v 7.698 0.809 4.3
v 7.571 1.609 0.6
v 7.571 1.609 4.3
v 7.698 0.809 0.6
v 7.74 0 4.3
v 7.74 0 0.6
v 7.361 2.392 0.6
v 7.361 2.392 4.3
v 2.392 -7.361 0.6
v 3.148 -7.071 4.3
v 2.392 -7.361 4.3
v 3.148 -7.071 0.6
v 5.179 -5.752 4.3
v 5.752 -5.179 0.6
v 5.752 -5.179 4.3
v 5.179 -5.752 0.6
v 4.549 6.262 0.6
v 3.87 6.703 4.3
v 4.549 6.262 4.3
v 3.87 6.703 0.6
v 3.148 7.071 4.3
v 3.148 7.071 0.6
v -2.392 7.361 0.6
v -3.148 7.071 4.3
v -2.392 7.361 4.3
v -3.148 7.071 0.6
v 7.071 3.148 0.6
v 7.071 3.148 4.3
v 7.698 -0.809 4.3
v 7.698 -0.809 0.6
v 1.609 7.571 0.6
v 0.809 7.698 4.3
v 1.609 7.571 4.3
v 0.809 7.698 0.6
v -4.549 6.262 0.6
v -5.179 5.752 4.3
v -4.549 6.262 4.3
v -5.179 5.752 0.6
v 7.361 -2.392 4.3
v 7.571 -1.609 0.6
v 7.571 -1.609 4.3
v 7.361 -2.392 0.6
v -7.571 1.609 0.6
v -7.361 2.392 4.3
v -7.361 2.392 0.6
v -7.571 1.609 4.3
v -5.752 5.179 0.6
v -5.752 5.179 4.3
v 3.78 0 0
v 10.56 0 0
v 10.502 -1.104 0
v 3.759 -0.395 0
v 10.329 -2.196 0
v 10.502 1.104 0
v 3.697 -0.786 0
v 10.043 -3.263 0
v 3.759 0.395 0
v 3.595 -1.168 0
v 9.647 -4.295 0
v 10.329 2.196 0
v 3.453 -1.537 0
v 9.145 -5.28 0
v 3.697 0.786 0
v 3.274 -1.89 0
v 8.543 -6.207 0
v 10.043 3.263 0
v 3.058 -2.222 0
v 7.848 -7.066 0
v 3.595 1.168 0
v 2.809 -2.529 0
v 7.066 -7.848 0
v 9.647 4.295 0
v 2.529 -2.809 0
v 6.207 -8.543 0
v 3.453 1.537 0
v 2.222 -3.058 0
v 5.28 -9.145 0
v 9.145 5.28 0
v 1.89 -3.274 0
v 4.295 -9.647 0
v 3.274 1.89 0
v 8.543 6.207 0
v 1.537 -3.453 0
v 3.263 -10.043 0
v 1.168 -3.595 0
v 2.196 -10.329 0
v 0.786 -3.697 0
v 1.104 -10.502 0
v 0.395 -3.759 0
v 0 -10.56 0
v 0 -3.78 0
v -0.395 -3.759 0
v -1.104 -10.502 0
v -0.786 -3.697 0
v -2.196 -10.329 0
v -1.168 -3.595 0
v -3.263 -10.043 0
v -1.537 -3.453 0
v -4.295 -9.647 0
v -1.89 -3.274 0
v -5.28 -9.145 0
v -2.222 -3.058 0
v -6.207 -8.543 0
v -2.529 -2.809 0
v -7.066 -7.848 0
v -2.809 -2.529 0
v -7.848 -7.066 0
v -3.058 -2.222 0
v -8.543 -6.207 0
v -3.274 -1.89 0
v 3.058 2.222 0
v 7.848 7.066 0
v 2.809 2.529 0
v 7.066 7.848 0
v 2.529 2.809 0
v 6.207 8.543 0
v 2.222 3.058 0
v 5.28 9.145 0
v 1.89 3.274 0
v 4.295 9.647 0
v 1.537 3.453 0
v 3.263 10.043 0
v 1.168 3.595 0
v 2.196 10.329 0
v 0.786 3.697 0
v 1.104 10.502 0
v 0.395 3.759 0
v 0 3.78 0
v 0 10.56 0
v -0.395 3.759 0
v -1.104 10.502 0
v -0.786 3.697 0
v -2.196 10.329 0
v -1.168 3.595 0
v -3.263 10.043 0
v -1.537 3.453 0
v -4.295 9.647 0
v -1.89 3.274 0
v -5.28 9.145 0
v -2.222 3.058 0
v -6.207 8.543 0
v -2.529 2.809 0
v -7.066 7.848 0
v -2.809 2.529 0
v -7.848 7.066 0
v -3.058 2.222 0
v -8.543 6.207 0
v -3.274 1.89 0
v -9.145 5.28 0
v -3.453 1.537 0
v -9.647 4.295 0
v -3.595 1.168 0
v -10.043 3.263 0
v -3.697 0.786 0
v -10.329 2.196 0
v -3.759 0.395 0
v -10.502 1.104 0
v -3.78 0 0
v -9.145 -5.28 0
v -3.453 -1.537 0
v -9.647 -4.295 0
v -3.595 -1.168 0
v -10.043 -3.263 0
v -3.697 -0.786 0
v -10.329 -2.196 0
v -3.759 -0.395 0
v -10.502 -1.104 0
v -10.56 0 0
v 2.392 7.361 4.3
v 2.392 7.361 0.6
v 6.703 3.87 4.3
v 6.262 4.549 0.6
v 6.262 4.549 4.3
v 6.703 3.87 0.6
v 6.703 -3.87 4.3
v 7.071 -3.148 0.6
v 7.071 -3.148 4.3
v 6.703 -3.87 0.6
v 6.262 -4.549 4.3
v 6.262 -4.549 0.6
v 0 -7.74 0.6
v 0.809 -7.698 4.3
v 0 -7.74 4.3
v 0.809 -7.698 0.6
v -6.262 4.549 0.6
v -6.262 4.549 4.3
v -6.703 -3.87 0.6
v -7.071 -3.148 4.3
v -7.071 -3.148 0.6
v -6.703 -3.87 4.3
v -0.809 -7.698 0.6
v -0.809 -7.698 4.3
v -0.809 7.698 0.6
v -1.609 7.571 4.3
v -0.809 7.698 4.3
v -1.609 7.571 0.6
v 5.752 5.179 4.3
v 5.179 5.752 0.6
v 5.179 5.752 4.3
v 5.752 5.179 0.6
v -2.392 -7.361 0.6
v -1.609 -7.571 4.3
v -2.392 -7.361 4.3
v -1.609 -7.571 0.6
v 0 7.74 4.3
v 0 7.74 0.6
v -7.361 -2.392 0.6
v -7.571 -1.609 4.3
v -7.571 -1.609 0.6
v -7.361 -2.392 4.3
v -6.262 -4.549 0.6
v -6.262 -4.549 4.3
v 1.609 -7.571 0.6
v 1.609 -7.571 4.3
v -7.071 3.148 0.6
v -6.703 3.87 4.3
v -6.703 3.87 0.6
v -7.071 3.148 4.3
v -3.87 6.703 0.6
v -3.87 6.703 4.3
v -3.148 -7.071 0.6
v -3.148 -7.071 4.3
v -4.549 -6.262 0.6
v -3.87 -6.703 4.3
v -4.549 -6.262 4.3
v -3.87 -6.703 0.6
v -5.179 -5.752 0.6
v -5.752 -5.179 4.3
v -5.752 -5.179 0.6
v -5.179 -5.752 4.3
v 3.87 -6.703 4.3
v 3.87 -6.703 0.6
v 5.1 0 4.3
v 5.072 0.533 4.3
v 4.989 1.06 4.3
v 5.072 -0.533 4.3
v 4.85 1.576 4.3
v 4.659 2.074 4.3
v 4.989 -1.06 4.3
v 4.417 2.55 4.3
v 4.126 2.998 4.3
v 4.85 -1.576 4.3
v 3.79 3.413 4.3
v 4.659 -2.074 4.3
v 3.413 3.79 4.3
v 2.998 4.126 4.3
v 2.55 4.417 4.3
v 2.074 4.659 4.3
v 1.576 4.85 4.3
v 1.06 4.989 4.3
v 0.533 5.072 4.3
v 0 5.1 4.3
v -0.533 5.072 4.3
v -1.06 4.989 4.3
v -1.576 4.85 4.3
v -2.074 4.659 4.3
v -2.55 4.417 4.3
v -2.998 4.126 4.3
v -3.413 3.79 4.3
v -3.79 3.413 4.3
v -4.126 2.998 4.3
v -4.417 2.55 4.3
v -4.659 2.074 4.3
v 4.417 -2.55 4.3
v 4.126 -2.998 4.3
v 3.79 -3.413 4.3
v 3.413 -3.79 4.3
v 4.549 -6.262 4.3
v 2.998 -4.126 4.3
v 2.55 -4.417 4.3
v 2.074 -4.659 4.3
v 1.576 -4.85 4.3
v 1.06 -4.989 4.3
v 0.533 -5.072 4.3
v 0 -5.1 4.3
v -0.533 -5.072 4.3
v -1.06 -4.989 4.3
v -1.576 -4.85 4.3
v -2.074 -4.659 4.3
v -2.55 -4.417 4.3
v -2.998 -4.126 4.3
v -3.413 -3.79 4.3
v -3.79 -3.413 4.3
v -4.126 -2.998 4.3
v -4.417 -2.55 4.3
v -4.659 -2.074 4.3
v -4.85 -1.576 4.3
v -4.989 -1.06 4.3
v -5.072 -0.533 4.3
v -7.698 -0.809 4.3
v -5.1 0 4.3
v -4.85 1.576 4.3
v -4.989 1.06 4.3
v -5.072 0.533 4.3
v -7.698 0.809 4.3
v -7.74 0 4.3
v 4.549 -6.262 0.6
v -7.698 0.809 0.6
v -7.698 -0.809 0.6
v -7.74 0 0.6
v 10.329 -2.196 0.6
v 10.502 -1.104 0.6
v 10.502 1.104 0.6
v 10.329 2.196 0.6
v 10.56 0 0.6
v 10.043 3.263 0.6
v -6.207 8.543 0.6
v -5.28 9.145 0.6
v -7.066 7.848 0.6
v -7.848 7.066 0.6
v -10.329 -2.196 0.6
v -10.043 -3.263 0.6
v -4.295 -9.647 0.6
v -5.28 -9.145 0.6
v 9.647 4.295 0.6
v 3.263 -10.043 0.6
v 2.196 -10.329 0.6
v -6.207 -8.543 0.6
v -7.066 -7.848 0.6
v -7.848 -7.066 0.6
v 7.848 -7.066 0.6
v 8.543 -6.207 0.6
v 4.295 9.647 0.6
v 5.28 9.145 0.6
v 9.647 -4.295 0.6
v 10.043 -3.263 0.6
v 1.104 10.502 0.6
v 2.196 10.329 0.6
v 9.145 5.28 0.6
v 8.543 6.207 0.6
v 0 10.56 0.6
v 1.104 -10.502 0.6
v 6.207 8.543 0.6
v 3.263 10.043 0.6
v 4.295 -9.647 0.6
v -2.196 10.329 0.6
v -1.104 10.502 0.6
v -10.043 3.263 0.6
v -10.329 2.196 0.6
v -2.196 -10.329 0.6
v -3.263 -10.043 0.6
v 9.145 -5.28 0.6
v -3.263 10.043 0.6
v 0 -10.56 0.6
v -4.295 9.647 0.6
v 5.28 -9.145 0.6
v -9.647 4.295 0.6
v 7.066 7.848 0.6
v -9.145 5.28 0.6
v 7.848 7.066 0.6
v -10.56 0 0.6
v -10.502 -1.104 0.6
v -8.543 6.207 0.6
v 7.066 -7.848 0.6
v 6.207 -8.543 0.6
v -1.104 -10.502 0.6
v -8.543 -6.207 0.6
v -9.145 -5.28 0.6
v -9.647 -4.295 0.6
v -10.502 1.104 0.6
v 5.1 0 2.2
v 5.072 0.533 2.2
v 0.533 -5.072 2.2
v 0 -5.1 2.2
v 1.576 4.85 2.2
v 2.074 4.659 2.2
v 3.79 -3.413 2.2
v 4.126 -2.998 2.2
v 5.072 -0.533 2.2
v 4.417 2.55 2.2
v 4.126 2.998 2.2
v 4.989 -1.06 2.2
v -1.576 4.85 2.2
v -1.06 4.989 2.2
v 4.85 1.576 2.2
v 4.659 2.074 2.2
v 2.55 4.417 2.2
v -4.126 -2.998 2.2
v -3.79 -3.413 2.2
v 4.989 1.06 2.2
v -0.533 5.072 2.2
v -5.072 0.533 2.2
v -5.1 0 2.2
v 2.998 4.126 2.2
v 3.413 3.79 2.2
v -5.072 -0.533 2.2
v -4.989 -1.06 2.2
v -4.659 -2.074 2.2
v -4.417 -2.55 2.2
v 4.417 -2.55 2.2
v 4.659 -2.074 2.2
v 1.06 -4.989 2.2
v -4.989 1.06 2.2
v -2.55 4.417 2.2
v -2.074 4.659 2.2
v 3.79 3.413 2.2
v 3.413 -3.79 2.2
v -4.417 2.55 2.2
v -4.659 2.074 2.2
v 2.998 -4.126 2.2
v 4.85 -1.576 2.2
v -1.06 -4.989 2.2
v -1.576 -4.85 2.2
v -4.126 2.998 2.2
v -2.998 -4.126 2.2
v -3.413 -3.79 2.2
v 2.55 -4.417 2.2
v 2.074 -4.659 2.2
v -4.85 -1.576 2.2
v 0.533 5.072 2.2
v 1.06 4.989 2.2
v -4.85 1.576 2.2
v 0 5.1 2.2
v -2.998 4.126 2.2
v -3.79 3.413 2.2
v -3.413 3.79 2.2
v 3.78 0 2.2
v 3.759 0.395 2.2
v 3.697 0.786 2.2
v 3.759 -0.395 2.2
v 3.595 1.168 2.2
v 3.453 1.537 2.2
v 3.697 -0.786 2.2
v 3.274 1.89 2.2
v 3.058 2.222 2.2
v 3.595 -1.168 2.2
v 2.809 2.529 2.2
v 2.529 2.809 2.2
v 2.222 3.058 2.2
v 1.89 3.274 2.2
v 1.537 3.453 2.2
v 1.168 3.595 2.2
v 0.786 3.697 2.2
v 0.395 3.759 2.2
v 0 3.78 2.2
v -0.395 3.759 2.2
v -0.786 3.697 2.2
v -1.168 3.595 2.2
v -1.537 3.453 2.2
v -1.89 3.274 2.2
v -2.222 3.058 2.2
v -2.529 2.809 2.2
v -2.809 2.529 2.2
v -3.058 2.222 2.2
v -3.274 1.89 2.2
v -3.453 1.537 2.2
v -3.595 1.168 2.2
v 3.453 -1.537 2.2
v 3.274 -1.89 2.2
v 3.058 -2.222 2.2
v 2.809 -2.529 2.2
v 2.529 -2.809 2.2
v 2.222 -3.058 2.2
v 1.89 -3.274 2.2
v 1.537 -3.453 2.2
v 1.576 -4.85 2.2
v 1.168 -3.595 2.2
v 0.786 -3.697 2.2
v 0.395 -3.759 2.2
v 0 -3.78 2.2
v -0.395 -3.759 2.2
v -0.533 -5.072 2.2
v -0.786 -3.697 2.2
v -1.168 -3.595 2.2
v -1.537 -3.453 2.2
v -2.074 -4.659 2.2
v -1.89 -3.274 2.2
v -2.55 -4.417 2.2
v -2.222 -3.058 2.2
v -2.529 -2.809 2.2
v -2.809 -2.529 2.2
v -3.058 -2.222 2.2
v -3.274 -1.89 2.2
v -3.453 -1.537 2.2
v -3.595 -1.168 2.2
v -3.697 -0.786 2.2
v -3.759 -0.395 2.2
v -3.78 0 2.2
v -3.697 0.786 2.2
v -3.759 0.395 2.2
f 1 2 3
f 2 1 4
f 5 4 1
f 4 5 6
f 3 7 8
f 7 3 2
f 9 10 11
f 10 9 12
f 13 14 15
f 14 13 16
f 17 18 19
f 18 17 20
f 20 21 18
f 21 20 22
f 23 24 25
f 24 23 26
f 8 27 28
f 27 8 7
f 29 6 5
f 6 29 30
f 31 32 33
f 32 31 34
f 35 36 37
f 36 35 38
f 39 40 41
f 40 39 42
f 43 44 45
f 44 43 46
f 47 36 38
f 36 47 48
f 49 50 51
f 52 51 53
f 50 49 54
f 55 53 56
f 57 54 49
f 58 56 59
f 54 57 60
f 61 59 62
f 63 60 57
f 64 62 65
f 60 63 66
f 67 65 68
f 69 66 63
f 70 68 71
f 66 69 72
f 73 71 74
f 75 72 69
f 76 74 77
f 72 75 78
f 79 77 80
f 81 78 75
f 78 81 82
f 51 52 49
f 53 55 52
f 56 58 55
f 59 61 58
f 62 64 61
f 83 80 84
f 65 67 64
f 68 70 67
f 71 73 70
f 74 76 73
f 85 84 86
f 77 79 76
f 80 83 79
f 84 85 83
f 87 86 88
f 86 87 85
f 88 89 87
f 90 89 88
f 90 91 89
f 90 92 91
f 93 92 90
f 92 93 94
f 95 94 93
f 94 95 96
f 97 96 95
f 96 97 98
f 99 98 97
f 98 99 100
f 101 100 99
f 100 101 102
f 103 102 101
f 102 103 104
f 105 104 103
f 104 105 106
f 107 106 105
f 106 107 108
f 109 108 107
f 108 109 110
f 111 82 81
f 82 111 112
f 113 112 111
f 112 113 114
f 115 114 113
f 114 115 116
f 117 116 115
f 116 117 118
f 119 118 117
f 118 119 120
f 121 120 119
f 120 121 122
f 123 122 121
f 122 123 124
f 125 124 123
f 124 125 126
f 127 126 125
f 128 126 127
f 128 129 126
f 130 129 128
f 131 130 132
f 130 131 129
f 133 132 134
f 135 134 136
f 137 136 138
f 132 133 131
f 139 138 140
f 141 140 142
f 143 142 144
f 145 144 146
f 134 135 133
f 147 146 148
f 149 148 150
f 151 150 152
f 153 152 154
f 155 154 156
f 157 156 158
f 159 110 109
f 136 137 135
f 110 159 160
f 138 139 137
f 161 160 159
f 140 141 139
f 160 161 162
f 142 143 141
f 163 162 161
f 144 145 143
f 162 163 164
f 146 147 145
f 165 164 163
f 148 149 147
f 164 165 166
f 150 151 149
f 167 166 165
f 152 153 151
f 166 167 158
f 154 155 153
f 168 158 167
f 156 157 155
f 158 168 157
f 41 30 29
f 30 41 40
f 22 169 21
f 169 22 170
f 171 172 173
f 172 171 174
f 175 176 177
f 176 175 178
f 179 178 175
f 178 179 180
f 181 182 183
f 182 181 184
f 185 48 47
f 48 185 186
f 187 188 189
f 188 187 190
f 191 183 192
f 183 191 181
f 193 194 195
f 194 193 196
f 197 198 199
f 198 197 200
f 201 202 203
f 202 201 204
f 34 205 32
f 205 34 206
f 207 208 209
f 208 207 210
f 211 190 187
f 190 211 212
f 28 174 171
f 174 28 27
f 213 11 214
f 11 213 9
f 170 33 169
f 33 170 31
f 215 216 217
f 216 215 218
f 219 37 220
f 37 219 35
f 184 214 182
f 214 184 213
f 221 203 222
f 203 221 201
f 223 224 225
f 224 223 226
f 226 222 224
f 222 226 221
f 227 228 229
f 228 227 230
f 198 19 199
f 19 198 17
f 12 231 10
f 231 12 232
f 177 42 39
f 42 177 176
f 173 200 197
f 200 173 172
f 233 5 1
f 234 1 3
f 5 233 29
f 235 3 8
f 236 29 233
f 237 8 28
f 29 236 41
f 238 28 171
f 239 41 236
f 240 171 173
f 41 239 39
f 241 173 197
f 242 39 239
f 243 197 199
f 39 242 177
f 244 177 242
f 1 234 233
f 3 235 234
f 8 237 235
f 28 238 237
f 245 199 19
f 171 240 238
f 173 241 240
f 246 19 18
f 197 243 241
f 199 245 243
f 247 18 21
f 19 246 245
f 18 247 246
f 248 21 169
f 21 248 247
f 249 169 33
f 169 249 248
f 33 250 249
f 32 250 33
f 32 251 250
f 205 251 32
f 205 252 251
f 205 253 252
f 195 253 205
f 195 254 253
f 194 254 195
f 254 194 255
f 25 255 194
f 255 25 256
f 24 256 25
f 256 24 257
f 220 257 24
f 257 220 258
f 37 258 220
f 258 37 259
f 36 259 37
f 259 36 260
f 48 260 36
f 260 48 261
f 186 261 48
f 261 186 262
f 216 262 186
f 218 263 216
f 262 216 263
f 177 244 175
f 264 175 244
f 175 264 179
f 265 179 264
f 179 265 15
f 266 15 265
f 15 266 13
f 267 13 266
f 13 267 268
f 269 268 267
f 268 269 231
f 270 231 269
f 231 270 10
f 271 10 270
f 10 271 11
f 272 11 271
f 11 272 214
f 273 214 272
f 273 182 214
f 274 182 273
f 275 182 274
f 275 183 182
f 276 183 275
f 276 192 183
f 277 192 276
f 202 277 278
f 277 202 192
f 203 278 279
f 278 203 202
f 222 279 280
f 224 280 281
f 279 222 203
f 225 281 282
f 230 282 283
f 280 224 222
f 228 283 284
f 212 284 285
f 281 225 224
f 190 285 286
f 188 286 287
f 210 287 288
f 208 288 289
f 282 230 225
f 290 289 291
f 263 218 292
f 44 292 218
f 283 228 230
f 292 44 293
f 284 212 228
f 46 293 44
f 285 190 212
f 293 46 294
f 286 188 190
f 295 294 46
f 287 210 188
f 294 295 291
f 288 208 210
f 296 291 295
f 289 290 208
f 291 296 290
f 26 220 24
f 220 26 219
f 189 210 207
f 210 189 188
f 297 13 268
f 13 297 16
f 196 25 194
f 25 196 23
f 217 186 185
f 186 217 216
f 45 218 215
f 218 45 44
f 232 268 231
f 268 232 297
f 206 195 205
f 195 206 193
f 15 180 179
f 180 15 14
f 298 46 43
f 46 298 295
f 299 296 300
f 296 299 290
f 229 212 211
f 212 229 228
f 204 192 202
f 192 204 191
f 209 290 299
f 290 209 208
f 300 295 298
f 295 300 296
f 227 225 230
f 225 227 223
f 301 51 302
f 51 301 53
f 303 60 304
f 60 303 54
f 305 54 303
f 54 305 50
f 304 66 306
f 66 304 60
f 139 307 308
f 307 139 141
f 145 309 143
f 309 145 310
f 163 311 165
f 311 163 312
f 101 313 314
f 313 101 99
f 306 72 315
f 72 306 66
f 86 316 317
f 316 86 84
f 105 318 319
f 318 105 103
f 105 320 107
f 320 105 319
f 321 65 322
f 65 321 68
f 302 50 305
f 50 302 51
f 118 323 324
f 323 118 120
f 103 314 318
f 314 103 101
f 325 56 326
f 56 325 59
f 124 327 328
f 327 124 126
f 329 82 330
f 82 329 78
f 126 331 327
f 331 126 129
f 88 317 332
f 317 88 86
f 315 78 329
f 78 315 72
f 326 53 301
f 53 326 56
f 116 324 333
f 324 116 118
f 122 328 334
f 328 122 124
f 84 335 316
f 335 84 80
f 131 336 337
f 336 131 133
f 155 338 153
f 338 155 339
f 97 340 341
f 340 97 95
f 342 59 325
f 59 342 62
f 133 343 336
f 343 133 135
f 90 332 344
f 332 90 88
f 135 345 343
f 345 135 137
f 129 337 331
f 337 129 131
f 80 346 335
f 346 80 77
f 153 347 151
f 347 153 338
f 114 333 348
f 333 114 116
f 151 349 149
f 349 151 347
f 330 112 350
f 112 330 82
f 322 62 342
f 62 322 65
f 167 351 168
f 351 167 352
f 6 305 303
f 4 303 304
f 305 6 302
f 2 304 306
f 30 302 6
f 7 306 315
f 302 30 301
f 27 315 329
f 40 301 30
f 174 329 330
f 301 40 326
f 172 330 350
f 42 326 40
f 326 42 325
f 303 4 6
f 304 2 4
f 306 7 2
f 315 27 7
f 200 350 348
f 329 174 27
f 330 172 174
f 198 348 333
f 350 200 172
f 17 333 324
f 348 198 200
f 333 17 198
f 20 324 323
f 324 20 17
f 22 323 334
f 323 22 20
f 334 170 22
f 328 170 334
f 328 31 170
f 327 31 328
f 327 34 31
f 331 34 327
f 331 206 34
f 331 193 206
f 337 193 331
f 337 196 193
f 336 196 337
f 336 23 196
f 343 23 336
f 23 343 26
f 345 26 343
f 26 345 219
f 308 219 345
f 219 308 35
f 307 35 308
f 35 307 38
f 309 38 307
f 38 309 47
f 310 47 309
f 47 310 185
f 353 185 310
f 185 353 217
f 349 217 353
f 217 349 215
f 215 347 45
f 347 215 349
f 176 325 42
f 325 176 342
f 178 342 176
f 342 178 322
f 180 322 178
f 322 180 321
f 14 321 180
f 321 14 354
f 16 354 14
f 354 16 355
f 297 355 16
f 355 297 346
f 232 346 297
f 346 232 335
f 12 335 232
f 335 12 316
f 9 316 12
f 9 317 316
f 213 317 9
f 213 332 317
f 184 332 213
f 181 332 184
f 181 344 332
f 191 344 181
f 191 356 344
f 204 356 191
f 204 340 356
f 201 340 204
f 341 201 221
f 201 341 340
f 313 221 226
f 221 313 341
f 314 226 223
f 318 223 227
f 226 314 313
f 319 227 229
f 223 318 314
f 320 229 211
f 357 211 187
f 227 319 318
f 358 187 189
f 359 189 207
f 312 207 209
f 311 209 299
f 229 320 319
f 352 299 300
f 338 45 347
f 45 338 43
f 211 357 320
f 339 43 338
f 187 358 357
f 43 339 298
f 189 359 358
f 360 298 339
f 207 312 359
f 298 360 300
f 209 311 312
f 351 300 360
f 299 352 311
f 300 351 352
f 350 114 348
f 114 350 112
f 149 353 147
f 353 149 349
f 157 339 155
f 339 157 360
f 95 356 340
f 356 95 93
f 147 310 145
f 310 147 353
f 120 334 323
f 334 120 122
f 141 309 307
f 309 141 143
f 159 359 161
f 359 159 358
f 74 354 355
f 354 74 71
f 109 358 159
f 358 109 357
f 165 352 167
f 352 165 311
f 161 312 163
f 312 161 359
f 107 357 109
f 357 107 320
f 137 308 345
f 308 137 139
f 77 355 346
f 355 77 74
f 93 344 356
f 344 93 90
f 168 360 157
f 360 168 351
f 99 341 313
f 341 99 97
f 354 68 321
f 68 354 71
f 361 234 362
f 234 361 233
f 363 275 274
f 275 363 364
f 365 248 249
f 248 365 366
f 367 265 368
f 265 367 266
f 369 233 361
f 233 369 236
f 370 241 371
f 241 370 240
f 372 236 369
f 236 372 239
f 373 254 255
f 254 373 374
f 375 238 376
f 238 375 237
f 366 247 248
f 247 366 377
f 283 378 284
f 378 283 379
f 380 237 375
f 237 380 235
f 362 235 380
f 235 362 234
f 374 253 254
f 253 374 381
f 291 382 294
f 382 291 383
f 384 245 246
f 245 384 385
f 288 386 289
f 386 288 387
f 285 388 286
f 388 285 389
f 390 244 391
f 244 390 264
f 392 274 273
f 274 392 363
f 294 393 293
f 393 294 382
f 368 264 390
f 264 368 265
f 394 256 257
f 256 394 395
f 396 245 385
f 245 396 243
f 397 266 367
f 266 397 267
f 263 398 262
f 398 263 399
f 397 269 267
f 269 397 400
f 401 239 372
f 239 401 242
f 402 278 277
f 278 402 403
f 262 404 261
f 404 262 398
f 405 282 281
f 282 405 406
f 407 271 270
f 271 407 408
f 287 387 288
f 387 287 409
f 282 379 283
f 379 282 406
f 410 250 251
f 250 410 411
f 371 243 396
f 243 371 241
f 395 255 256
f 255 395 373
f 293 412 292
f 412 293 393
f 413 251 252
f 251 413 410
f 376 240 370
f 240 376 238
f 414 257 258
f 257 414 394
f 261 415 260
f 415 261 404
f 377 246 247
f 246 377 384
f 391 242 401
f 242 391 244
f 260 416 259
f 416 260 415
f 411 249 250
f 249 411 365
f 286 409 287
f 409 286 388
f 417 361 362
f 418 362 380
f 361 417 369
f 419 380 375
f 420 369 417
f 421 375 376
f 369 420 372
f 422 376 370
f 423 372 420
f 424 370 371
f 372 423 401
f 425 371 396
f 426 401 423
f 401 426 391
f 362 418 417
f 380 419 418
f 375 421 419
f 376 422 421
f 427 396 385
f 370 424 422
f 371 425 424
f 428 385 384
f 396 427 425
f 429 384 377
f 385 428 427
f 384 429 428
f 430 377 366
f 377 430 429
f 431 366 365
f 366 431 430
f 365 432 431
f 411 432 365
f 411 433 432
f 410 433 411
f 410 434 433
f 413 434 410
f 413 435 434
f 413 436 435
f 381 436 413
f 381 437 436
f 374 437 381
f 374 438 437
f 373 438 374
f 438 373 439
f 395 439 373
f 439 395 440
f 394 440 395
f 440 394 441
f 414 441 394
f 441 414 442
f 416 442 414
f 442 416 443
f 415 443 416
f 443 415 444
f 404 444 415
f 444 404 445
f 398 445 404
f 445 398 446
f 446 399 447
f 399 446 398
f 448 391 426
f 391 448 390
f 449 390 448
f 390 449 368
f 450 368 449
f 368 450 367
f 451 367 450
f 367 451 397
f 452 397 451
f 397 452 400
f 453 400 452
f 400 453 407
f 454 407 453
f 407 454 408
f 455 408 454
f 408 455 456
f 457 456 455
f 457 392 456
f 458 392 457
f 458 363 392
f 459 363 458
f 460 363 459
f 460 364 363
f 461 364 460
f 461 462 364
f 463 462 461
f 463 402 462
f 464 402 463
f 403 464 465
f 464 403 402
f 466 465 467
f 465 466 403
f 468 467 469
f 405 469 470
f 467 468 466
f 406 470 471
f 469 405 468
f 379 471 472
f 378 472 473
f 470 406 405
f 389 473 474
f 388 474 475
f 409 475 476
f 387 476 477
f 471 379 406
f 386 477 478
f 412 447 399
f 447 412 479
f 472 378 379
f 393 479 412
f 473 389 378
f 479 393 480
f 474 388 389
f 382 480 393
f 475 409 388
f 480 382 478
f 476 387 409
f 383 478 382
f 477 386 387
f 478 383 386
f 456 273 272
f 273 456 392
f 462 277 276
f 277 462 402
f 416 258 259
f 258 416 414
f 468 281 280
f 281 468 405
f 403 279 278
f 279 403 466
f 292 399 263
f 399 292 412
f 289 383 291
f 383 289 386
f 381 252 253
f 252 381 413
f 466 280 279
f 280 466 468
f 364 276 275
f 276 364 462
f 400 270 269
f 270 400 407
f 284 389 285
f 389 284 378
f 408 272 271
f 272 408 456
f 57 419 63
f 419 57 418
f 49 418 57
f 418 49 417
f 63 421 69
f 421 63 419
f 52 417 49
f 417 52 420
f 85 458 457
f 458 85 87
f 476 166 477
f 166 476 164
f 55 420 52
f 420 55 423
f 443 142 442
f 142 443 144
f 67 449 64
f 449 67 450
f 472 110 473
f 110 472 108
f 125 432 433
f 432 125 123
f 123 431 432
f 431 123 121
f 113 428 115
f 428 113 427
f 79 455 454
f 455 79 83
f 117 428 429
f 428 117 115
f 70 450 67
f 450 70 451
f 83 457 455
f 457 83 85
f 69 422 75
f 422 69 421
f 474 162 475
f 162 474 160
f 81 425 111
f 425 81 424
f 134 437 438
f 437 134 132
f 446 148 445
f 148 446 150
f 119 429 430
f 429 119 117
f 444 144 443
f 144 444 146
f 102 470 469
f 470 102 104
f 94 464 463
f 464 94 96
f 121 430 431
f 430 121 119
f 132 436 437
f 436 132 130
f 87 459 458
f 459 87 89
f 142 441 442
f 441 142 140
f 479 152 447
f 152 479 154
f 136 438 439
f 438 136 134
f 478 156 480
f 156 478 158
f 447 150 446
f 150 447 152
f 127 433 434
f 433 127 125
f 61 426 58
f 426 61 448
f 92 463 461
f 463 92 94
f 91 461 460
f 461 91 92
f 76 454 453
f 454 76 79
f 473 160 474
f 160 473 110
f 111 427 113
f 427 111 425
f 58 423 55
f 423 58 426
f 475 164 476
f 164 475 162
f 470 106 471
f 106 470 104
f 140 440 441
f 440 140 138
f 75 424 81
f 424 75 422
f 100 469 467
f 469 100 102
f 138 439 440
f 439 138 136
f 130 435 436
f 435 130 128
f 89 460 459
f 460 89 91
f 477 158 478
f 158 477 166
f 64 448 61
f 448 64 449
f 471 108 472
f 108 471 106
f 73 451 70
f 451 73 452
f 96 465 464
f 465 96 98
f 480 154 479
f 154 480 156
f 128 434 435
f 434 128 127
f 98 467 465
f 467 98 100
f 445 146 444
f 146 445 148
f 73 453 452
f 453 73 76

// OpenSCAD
// file: ../configuration.scad
// Vyska vrstvy pro tisknuti dilu [mm]
layer_height = 0.3; //Slic3r->Print Settings->Layers and perimeters->Layer height

// Rezerva prumeru hlavy sroubu [mm]
spare = 1;
// Prumer hlavy M6 sroubu (pricte se rezerva) [mm]
M6_head_diameter = 10.6+spare;
//M6_head_diameter = 12+spare;

// Vyska hlavy M6 sroubu (dulezite pro zapusteni hlavy sroubu do plastu) [mm]
M6_head_height = 3.6;
//M6_head_height = 4.5;

// Delka motoru (ovlivni dily pro osy Z a Y)
//SX17-1003LQFE (doporuceno hlavne na osu Z)
motor_length = 29.5;
//SX17-1003 (doporuceno hlavne na osu Z)
//motor_length = 34;
//SX17-1005
//motor_length = 40;
//SX17-0905 - zde je jiz problem s velkou vyskou motoru na ose Z - musi se upravit endstop-holder
//motor_length = 48;

// Sirka vytlacovaneho materialu [mm]
extrusion_width = 0.66; //Slic3r->Print Settings->Advanced->Default extrusion width

/// Vyberte typ remenu ******************************************************

// GT2 
//belt_tooth_distance = 2;
//belt_tooth_ratio = 0.5;

// T2.5
belt_tooth_distance = 2.5;
belt_tooth_ratio = 0.68;
// main file
// PRUSA iteration3
// 623 bearing belt guide
// GNU GPL v3
// Josef Průša <iam@josefprusa.cz> and contributors
// http://www.reprap.org/wiki/Prusa_Mendel
// http://prusamendel.org

include <../configuration.scad>

wall= 2*extrusion_width;
clearence= 0.1; 

module belt_guide_base(){
 cylinder(r=5+clearence+2*wall, h=5-0.7, $fn=60);
 //cylinder(r=6.5+wall+clearence, h=5-0.2, $fn=50);
 cylinder(r=6.5+wall+clearence+2*wall, h=0.6, $fn=60);
}

module belt_guide_holes(){
 translate([0,0,2.2]) cylinder(r=5+clearence, h=10, $fn=60);
 translate([0,0,-1]) cylinder(r=5+wall+clearence-2*wall, h=10, $fn=60);
}

// Final part
module belt_guide(){
 difference(){
  belt_guide_base();
  belt_guide_holes();
 }
}

belt_guide();
